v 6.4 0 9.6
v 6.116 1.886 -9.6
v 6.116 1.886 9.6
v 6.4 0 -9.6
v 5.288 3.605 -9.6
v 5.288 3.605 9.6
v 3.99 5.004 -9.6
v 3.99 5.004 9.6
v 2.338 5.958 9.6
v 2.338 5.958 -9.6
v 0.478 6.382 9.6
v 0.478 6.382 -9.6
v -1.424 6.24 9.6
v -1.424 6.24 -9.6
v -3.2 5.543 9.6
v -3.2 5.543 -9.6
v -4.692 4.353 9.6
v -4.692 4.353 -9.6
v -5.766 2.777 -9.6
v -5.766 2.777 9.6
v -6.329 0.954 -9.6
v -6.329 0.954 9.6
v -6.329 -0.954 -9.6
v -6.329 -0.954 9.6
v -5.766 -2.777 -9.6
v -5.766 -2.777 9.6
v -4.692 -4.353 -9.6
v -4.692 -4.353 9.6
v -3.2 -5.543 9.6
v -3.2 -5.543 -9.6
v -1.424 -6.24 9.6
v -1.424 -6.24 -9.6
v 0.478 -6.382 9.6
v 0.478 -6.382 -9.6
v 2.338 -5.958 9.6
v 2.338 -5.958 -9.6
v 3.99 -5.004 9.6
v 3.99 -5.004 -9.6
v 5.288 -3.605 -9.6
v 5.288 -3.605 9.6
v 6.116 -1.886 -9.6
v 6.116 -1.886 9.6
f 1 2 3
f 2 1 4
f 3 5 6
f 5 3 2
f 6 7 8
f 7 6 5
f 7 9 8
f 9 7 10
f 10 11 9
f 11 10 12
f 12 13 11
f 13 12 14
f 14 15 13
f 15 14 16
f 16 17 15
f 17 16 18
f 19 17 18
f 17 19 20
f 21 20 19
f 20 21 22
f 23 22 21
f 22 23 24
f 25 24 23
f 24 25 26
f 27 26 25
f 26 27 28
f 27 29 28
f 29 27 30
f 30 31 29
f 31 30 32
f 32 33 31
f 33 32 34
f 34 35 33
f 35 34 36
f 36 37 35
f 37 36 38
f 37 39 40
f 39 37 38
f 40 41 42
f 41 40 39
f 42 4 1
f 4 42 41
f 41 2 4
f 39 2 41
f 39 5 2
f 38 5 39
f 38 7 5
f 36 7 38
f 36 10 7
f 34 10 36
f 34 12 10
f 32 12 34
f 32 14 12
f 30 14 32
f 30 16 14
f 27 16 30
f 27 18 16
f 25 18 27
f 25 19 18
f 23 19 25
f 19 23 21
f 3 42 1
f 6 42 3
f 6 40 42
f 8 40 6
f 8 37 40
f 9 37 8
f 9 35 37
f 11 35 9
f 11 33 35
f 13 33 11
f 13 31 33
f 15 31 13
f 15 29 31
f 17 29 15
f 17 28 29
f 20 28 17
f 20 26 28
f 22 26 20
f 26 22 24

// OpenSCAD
// file: ../configurations/global.scad
// gold_number = 1.618;

housing_facades_throws_diameter = 3.8;

// external size
case_external_x_size = 165;
case_external_y_size = 92;
case_external_z_size = 38;
case_external_panes_thickness = 4.8;

facade_front_round_edges_radius = 5;
facade_throws_margin = 5;

// facade corners
facade_corners_offset_lenght = 9;
facade_corners_main_x_size = 19;
facade_corners_main_y_size = 19;
facade_corners_main_thickness = 11;
facade_corners_correction_offset_length = 0.2;
facade_corners_correction_offset_thickness = 0.0;
facade_fn = 100;


// Generics
insert_throw_diameter = 4.2;
insert_throw_length = 6 + 2;


// mother board
mother_board_cny70set_x_point_coord = 10;
mother_board_cny70set_y_point_coord = 7;



// Cassette
cassette_x_size = 50;
cassette_y_size = 31;
cassette_z_size = 4.8;
cassette_round_radius = 4;

// Cassette case
cassette_case_x_size = 76.2;
cassette_case_y_size = 55.88;
cassette_case_z_size = 9;
cassette_case_round_radius = 1;

cassette_case_x_y_margin = 0.75;

cassette_case_embed_x_size = 62;
cassette_case_embed_y_size = 42;
cassette_case_embed_z_size = 4.8;
cassette_case_embed_offsets = 10;
cassette_case_embed_round_radius = 6;

cassette_case_throws_margin = 2.54 * 2;
cassette_case_throws_diameter = 3;
cassette_case_grip_enveloppe_diameter = 15;
cassette_case_grip_enveloppe_offset = 3;

cassette_case_cny70set_x_point_coord = mother_board_cny70set_x_point_coord;
cassette_case_cny70set_y_point_coord = mother_board_cny70set_y_point_coord;
cassette_case_cny70set_x_y_margin = 0.5;

// Front panel throw cassette case mounting 
cassette_case_embed_throw_margin = 0.5;


// Mother board joins
bolt_join_mother_board_internal_diameter = 3.5;
bolt_join_mother_board_external_diameter = 3.5 + (0.4 * 12);
bolt_join_mother_board_height = 8.5;
bolt_join_fn = 200;


// speaker facade
speaker_facade_x_size = 50;
speaker_facade_y_size = cassette_case_y_size - cassette_case_throws_margin * 2 + 6;
speaker_facade_z_size = 2;
speaker_facade_rounded_radius = 3;
speaker_facade_fixation_throws_margin = 3.5;
speaker_facade_fixation_throws_diameter = 3;
speaker_facade_throw_diameter = 40+1;
// 
facade_top_on_off_button_throw_diameter = 12.8;


facade_cassette_case_coords = [
    60 + 5,
    23,
];

facade_speaker_40mm_coords = [
    32 + 5,
    facade_cassette_case_coords[1] + (cassette_case_y_size / 2),
];

batteries_holder_coords = [
    8 + 5,
    20
];

volume_buttons_spacing = 20;
//volume_buttons_coords = [145,50];
volume_buttons_coords = [
    145 + 5 ,
    facade_cassette_case_coords[1] + (cassette_case_y_size / 2),
];

controller_buttons_spacing = 20;
//controller_buttons_coords = [98,14];
controller_buttons_coords = [
    facade_cassette_case_coords[0] + (cassette_case_x_size / 2),
    14
];

controller_onoff_coords = [
    32 + 5,
    14
];
// main file
include <../configurations/global.scad>

/**
 * onOffButtonThrowEnveloppe
 * @name onOffButtonThrowEnveloppe
 * @description onOffButtonThrowEnveloppe
 * @type enveloppe
 * @parent root
 */
module onOffButtonThrowEnveloppe(
    z_size = case_external_panes_thickness * 4,
    throw_diameter = facade_top_on_off_button_throw_diameter
) {
    cylinder(h = z_size, d = throw_diameter, center = true, $fn = $fn);
}

onOffButtonThrowEnveloppe();
